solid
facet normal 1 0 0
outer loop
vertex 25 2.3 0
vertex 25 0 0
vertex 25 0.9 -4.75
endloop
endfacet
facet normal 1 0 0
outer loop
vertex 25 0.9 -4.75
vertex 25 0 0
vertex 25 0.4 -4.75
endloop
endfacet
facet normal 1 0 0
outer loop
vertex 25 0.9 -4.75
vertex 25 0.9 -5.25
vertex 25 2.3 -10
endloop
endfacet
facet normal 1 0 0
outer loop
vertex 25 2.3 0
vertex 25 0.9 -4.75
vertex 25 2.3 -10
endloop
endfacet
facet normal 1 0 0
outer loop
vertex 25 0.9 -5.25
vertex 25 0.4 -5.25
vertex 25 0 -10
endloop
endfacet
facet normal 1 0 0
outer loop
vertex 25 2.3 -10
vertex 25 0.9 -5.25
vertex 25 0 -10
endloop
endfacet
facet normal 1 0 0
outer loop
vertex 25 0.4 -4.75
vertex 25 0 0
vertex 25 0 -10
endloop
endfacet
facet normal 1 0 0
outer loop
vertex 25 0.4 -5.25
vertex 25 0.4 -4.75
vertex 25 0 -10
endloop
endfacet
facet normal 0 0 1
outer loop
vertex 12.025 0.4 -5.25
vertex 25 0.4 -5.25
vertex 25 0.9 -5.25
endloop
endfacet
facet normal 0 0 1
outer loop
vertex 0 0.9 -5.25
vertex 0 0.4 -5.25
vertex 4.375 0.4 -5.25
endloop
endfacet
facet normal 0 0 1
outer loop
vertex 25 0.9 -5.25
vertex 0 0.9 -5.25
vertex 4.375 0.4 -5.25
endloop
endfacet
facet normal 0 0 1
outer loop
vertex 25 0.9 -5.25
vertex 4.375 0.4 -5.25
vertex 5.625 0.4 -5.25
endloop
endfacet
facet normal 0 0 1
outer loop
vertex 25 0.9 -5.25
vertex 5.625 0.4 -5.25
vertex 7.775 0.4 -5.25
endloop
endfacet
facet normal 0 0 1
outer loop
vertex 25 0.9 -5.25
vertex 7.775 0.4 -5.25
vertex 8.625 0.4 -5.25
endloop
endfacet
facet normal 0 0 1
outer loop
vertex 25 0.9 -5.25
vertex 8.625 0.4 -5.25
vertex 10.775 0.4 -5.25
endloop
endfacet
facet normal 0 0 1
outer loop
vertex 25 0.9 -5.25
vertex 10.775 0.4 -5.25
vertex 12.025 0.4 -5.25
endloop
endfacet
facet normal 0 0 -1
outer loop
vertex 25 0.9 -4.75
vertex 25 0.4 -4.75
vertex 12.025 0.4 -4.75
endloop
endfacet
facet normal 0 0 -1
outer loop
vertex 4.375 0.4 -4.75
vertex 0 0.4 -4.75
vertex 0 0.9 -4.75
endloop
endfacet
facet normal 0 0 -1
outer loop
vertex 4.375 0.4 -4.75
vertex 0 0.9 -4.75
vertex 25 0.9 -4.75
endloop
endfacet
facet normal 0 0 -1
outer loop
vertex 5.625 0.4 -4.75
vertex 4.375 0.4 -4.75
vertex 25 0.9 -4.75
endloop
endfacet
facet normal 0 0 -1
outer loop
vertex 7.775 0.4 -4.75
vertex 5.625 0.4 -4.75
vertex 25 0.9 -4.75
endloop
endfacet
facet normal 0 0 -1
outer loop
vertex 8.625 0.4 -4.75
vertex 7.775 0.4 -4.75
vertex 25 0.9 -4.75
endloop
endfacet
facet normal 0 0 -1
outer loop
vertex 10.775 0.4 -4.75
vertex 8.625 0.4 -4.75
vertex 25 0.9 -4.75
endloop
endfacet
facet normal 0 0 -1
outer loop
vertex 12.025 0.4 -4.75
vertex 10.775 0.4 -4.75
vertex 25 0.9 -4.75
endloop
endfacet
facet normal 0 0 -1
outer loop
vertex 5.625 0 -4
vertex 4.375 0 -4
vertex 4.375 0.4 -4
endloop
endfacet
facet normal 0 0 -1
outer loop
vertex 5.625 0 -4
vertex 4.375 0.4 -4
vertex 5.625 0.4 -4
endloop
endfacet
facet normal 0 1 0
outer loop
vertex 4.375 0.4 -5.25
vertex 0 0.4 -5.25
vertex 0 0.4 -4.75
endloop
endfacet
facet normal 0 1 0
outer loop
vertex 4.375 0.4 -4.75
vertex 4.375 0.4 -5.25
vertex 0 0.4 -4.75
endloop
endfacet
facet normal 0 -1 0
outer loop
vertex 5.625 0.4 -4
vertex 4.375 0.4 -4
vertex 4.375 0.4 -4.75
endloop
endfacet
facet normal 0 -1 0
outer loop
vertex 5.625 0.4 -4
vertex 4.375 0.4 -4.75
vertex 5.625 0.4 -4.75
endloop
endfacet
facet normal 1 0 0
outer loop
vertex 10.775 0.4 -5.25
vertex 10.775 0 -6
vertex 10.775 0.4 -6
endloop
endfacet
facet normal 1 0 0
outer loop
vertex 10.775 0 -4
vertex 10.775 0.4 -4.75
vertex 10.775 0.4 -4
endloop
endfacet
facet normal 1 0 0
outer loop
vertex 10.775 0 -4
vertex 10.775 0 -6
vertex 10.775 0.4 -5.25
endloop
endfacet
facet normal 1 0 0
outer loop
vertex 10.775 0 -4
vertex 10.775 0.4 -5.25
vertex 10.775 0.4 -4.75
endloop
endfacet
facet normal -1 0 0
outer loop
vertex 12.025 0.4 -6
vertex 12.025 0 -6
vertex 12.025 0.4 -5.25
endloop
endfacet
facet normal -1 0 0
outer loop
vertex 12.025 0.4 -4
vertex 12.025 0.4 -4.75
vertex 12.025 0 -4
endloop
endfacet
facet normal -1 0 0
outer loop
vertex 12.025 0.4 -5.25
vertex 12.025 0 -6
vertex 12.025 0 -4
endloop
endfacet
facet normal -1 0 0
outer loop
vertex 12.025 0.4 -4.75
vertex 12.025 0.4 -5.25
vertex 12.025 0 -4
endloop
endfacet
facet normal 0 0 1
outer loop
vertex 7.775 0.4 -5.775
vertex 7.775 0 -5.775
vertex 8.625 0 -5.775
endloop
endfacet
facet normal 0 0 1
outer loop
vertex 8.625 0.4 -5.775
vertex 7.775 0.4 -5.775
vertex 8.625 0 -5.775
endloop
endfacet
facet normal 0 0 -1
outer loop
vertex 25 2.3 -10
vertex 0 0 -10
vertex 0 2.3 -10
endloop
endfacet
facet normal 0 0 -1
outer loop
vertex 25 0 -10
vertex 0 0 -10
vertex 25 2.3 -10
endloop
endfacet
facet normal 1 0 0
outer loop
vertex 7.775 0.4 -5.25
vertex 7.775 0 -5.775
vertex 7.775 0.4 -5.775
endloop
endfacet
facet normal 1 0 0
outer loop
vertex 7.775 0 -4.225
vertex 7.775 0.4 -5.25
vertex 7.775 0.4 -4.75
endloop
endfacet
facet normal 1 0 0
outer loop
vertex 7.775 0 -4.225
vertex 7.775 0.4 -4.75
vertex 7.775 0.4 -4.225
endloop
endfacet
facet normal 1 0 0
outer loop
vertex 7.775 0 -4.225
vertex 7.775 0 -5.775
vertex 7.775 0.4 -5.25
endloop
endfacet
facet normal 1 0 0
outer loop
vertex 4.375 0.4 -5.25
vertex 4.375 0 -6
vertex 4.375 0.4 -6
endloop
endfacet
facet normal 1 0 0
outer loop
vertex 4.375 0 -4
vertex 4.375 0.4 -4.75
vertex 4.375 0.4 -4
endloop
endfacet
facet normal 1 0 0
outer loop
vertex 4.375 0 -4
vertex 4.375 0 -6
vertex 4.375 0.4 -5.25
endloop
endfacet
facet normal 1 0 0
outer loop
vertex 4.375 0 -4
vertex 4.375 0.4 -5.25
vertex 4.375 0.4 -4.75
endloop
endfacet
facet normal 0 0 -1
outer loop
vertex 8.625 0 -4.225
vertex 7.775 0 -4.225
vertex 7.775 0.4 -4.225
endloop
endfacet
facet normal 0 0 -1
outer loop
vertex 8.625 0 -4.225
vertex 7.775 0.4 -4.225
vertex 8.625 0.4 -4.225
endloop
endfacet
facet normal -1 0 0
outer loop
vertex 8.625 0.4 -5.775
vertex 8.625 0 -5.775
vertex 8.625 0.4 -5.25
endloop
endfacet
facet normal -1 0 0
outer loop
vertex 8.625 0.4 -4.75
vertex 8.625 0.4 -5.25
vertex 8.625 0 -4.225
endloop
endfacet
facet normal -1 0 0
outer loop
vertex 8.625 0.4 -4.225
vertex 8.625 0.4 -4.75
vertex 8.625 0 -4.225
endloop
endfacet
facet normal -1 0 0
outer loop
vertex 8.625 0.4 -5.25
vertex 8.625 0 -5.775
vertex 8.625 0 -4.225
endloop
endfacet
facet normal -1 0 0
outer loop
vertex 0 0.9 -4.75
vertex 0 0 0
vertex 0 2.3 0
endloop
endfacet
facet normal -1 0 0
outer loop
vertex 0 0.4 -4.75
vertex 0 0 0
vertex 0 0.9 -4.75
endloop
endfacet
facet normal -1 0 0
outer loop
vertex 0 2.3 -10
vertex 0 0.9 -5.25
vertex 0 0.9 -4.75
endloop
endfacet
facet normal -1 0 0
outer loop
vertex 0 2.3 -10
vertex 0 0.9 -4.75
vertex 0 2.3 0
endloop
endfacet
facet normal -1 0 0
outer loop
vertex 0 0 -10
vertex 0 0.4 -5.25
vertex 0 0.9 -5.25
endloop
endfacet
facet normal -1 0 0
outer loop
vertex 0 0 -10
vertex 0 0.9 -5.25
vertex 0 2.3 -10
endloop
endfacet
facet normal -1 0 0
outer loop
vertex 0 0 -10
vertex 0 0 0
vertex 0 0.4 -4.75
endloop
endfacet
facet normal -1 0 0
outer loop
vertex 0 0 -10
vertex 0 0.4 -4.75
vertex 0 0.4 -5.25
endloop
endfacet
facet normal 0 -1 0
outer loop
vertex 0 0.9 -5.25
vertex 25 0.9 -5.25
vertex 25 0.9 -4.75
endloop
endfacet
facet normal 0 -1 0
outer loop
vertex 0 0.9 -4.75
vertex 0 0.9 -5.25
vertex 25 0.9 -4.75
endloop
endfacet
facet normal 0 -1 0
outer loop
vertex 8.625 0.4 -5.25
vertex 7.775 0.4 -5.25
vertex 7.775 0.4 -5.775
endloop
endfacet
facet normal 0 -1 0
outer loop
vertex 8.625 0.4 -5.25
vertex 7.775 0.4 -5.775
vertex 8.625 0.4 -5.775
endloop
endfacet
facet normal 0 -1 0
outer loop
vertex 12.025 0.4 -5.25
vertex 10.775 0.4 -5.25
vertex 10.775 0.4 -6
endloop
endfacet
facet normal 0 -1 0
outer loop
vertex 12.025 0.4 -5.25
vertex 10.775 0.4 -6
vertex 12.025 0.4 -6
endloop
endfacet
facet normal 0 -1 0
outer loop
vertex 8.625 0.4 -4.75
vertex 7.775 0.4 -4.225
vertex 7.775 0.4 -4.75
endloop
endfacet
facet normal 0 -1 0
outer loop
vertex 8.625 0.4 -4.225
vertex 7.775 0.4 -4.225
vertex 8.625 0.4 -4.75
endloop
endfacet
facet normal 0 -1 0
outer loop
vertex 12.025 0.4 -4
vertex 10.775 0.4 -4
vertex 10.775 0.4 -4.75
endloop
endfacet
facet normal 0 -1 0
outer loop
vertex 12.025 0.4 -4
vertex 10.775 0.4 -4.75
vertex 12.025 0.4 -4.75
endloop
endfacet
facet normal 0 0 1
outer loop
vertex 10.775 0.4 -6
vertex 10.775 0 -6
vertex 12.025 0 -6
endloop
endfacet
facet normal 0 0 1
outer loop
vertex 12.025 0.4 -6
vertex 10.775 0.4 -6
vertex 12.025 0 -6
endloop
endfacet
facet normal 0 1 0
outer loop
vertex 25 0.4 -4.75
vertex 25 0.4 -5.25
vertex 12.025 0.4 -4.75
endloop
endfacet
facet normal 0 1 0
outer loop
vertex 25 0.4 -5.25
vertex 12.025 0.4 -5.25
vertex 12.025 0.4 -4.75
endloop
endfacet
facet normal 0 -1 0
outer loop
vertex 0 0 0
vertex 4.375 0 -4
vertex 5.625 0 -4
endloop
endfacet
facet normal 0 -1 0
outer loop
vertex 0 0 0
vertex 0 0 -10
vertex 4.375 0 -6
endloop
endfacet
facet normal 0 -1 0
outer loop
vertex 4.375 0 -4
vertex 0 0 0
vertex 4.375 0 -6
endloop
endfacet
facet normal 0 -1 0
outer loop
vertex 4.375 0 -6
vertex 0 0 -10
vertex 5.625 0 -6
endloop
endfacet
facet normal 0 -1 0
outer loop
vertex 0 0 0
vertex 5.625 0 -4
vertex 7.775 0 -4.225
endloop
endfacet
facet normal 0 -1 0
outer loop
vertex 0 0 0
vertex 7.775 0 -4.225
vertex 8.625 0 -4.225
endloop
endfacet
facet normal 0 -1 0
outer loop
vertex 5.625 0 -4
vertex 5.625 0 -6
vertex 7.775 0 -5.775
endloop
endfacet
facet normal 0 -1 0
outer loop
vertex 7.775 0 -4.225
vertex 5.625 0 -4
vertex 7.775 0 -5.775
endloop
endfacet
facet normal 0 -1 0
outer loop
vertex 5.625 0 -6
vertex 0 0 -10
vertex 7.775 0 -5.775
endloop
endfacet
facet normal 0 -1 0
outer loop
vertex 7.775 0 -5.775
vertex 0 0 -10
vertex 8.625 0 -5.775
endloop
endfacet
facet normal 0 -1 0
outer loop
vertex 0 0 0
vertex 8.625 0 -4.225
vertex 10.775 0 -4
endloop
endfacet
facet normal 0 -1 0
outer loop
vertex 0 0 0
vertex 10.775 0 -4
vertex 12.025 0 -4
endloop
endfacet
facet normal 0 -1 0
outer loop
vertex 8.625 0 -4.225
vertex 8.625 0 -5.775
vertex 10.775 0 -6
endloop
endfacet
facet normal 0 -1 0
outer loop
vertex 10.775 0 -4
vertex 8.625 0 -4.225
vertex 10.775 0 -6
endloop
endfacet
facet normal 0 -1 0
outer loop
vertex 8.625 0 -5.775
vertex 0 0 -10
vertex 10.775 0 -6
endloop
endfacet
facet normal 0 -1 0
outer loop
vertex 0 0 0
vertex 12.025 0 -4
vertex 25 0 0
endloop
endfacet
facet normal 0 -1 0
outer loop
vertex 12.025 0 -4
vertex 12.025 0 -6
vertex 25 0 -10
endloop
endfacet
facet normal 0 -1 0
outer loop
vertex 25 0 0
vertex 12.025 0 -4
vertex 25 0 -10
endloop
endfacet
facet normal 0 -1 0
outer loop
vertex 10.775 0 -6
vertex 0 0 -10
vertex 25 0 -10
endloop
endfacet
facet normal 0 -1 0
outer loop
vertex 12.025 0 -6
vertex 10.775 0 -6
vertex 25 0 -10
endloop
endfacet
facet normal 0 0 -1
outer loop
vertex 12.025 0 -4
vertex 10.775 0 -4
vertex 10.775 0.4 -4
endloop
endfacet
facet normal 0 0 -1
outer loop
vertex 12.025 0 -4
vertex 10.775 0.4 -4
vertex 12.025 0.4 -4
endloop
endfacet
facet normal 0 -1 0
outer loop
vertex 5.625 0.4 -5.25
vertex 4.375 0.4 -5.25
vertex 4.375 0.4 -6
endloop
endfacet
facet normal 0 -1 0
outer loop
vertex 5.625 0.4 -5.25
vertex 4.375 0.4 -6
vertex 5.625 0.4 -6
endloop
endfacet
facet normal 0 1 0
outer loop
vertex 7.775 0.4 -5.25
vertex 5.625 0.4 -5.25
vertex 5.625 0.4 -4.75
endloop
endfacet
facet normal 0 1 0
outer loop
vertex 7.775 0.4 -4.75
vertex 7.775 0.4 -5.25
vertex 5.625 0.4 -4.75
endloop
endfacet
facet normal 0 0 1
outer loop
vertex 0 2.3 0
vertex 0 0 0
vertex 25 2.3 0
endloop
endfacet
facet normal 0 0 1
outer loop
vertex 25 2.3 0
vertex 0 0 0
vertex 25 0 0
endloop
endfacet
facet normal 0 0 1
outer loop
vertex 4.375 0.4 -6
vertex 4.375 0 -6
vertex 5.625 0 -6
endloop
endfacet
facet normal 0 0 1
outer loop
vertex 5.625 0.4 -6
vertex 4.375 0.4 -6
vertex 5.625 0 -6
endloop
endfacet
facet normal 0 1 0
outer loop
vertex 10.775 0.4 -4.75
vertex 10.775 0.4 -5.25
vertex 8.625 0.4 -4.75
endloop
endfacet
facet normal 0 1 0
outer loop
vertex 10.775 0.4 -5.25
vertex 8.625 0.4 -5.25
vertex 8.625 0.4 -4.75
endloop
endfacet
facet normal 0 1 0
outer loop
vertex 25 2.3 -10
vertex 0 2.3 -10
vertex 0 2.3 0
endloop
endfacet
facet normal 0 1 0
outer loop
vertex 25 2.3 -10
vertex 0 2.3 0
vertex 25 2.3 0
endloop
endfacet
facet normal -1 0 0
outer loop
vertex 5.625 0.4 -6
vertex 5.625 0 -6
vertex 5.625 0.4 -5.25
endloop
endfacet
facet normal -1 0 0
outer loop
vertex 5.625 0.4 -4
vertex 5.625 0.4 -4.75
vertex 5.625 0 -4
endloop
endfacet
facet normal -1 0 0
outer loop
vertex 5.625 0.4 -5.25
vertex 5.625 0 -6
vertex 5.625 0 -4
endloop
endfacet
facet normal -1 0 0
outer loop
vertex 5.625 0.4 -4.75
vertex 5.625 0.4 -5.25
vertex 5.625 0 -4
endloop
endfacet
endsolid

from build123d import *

# Parameters (mm, degrees)
SKETCH1_W           = 25
SKETCH1_H           = 10
BOSS_EXTRUDE1_DEPTH = 2.3
SKETCH2_W           = 0.85
SKETCH2_H           = 1.55
CUT_EXTRUDE1_DEPTH  = 0.4
CUT_EXTRUDE2_REACH  = 27
SKETCH3_W           = 0.5
SKETCH3_H           = 0.5
SKETCH7_W           = 1.25
SKETCH7_H           = 2
CUT_EXTRUDE4_DEPTH  = 0.4


with BuildPart() as part:
    # Sketch1 → Boss-Extrude1 (new body)
    with BuildSketch(Plane(origin=(0, 0, 0), x_dir=(1, 0, 0), z_dir=(0, 1, 0))):
        with Locations((12.5, 5)):
            Rectangle(SKETCH1_W, SKETCH1_H)
    extrude(amount=BOSS_EXTRUDE1_DEPTH)

    # Sketch2 → Cut-Extrude1 (cut)
    with BuildSketch(Plane.XZ):
        with Locations((8.2, -5)):
            Rectangle(SKETCH2_W, SKETCH2_H)
    extrude(amount=-CUT_EXTRUDE1_DEPTH, mode=Mode.SUBTRACT)

    # Sketch3 → Cut-Extrude2 (cut, up to next)
    with BuildSketch(Plane.ZY, mode=Mode.PRIVATE) as cut_extrude2_sk1:
        with Locations((-5, 0.65)):
            Rectangle(SKETCH3_W, SKETCH3_H)
    cut_extrude2_tool1 = extrude(cut_extrude2_sk1.sketch, amount=-CUT_EXTRUDE2_REACH, mode=Mode.PRIVATE) & part.part
    add(cut_extrude2_tool1.solids().sort_by_distance((0, 0.65, -5))[0], mode=Mode.SUBTRACT)

    # Sketch7 → Cut-Extrude4 (cut)
    with BuildSketch(Plane.XZ):
        with Locations((5, -5)):
            Rectangle(SKETCH7_W, SKETCH7_H)
        with Locations((11.4, -5)):
            Rectangle(SKETCH7_W, SKETCH7_H)
    extrude(amount=-CUT_EXTRUDE4_DEPTH, mode=Mode.SUBTRACT)


solid = part.part
